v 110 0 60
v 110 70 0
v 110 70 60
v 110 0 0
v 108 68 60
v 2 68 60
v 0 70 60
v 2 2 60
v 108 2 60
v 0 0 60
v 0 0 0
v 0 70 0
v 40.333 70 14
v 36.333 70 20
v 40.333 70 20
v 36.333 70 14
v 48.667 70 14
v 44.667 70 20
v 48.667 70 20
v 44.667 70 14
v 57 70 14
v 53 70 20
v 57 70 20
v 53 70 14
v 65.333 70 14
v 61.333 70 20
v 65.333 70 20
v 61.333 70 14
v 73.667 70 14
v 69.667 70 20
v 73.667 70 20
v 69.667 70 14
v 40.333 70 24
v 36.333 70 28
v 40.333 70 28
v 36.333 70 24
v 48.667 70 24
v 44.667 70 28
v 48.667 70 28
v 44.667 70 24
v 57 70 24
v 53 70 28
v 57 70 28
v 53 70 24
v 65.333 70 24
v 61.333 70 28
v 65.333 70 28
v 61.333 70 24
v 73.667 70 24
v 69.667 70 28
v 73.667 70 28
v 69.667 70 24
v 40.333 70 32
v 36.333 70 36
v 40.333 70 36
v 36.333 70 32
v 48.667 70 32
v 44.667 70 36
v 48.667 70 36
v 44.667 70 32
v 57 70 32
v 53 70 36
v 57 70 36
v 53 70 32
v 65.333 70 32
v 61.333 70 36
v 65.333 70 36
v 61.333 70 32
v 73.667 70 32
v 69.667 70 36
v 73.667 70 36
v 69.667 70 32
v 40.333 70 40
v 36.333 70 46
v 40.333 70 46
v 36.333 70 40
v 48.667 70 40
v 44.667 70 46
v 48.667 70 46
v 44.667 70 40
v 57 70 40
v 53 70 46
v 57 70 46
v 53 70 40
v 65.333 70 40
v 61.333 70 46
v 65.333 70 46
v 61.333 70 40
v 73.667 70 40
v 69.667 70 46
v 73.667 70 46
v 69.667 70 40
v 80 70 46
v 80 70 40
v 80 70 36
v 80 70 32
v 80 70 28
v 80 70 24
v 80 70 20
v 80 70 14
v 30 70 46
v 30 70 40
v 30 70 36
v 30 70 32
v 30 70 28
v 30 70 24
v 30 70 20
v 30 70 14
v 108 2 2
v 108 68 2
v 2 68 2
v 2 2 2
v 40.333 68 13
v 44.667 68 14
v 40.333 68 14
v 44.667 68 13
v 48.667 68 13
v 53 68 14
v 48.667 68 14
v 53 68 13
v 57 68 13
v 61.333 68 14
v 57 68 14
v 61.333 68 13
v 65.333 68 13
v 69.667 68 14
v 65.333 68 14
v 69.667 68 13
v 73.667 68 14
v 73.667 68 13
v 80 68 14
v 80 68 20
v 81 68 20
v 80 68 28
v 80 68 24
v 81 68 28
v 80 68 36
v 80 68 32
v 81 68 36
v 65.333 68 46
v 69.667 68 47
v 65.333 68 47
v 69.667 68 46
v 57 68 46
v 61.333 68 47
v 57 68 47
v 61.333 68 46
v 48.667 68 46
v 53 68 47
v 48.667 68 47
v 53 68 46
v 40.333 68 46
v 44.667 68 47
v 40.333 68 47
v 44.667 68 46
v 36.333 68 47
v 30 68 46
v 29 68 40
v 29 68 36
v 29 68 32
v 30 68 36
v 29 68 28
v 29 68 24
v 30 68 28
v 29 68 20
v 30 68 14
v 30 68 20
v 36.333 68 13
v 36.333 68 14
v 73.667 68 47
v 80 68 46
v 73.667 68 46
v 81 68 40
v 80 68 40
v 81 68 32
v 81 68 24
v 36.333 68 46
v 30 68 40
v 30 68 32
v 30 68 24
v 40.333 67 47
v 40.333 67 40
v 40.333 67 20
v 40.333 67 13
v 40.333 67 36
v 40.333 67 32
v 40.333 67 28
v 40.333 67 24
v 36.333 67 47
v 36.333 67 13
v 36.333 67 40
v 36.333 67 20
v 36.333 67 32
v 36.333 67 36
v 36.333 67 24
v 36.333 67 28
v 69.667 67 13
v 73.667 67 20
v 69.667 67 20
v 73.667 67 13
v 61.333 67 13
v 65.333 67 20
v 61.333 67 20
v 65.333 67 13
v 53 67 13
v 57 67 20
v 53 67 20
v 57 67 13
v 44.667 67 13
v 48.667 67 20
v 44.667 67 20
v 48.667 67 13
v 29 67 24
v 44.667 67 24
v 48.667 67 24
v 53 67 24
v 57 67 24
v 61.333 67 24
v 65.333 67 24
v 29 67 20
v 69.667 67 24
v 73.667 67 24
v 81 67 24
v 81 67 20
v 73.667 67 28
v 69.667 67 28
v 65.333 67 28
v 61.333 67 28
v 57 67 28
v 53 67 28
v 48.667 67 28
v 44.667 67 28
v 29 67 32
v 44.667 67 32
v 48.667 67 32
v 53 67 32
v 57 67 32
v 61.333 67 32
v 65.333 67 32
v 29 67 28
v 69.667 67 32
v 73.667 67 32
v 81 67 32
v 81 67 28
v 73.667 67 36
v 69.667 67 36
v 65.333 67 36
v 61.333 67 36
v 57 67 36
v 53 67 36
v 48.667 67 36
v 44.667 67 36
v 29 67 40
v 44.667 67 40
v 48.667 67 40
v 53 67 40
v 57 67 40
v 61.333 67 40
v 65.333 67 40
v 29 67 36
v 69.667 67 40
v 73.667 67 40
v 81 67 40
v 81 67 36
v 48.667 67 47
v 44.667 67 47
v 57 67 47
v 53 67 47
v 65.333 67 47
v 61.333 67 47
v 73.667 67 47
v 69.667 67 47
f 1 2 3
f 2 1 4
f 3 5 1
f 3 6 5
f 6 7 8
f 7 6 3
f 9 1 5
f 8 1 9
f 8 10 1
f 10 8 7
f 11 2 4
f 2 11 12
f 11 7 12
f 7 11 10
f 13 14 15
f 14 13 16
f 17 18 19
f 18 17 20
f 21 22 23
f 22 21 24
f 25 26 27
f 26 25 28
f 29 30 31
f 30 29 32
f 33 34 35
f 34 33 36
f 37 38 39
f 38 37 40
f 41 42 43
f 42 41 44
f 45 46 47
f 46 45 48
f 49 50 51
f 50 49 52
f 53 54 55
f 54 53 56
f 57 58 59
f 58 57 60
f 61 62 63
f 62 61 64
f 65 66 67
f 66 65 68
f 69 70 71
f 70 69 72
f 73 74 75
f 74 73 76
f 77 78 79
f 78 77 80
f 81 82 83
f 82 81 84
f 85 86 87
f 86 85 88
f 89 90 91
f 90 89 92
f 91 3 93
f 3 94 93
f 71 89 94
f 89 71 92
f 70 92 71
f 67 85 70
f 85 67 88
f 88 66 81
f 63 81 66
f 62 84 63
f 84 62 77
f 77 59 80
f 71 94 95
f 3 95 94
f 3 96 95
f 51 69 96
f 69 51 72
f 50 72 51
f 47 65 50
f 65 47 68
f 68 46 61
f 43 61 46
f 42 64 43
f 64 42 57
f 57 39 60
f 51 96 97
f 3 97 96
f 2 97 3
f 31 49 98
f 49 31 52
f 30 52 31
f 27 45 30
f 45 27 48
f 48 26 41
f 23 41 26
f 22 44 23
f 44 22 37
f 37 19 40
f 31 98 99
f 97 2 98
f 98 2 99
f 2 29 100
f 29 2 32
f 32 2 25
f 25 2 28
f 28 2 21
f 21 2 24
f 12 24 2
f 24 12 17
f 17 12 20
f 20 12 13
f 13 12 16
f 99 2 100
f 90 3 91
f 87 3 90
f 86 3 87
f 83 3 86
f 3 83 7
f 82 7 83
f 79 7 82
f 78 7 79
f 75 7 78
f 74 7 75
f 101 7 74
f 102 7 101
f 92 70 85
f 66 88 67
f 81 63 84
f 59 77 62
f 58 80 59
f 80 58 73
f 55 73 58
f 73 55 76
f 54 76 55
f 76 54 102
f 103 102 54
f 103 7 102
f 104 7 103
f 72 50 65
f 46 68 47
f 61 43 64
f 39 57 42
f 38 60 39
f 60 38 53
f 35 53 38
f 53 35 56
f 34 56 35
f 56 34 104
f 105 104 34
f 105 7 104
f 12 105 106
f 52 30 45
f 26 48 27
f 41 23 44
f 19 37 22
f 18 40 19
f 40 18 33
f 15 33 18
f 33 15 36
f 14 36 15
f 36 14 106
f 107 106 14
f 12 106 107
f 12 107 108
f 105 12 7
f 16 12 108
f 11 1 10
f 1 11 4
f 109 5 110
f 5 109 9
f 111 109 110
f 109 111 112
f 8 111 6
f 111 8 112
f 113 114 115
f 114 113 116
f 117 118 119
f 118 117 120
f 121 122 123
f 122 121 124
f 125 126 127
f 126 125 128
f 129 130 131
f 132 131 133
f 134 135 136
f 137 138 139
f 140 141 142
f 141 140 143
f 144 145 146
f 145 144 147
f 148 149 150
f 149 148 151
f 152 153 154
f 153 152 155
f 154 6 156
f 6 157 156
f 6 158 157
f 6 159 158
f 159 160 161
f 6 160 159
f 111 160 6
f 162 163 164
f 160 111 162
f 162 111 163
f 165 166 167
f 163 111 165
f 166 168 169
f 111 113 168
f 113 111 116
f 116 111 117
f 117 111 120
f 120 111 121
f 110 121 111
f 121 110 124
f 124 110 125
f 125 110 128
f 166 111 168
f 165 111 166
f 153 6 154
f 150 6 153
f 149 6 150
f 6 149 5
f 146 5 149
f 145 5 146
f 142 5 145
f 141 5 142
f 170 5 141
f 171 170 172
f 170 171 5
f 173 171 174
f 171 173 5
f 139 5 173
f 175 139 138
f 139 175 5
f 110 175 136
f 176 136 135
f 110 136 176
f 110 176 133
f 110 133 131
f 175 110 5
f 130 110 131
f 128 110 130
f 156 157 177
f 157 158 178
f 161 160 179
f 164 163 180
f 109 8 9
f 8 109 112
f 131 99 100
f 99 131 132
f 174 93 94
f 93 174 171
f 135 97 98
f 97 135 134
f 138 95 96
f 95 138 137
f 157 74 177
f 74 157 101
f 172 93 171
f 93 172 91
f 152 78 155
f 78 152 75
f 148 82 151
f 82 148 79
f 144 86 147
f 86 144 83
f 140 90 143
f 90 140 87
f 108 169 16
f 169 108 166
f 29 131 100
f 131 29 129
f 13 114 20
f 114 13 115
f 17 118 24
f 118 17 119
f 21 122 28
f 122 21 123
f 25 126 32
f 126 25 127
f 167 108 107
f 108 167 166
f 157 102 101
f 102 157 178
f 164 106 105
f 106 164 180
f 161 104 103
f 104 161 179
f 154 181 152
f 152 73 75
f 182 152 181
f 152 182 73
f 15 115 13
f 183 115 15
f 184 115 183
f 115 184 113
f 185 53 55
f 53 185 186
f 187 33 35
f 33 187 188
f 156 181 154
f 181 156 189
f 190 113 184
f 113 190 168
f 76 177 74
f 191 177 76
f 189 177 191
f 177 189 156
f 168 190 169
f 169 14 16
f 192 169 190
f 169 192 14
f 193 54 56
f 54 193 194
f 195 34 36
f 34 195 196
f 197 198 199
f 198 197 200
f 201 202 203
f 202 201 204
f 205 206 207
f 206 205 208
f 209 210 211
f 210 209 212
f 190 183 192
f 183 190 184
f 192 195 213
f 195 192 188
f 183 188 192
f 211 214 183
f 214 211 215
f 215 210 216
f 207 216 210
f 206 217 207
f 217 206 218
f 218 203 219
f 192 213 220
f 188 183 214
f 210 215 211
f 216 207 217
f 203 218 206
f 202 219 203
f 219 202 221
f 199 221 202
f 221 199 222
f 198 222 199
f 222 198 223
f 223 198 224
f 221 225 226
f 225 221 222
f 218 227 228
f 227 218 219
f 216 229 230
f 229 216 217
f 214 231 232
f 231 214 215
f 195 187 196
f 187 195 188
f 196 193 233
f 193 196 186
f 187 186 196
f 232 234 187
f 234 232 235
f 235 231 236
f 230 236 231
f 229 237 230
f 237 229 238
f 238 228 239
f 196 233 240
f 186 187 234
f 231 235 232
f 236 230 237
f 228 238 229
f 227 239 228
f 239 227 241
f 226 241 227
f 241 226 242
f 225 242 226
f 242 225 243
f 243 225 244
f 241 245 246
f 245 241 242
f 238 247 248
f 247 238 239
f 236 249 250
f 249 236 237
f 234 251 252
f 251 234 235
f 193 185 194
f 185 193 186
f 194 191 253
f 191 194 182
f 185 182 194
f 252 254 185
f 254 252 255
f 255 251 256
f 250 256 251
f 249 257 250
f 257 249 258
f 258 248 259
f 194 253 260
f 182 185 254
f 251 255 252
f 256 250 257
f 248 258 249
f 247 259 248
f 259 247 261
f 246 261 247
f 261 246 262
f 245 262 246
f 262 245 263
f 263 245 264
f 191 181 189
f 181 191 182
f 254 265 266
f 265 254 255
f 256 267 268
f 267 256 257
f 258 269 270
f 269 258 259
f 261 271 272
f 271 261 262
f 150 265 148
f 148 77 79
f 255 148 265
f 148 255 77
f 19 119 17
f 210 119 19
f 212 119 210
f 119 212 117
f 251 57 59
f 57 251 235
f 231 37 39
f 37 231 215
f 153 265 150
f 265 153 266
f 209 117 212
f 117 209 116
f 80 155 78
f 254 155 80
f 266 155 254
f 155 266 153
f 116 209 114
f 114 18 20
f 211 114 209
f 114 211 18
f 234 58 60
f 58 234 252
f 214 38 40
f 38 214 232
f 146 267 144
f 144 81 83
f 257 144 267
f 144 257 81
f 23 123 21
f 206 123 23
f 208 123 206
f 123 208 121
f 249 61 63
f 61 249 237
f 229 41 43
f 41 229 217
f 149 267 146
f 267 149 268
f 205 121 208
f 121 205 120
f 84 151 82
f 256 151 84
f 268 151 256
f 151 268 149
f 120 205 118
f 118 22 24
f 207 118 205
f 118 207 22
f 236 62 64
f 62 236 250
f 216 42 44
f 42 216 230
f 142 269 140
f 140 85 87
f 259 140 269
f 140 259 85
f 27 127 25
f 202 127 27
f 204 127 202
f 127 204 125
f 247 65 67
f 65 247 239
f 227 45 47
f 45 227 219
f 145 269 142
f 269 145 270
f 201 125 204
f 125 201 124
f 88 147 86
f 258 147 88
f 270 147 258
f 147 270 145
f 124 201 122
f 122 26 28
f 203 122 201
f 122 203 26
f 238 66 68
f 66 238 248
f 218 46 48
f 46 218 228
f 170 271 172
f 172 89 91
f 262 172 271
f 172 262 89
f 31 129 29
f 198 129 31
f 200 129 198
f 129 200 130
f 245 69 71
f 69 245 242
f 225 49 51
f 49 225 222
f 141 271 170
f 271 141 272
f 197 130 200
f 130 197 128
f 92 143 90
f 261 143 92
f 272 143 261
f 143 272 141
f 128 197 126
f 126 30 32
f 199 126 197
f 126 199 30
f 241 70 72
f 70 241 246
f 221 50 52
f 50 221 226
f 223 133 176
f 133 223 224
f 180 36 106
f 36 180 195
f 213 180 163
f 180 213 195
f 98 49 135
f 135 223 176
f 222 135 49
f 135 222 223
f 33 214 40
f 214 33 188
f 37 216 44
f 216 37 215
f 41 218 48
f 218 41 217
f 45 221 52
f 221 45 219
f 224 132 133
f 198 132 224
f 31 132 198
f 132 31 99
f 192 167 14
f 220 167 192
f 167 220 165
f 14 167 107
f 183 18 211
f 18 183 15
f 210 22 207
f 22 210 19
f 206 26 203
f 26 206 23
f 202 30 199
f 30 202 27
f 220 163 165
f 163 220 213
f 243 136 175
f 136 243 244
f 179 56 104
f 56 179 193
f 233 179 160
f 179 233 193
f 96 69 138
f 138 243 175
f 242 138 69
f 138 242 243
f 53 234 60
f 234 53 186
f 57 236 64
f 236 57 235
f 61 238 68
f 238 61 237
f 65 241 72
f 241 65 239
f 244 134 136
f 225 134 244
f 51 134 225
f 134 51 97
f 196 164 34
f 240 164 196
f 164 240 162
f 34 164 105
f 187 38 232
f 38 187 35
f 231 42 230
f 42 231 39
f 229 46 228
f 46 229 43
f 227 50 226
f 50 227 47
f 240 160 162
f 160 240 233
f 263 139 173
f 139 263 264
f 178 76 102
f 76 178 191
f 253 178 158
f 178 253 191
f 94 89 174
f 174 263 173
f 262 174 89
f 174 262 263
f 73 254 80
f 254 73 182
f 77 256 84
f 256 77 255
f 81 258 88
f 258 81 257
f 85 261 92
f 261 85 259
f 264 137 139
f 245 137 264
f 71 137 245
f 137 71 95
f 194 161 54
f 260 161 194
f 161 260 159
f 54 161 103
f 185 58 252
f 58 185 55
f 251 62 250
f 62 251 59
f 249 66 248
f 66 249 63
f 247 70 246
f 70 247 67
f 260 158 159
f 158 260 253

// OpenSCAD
$fn = 32;

// ----------------------------------------------------------------------
// Vent box: crossgrid enclosure
// ----------------------------------------------------------------------

// --- parameters (mm) ---
box_l = 110;              // box length, X
box_w = 70;               // box width, Y
box_h = 60;               // box height, Z
wall_t = 2;               // shell wall thickness
win_l = 50;               // vent window width, X
win_h = 32;               // vent window height, Z
bar_w = 4;                // grid bar width
n_v = 5;                  // vertical bar count
n_h = 3;                  // horizontal bar count

win_z0 = (box_h - win_h) / 2;  // window lower edge Z
v_step = win_l / (n_v + 1);  // vertical bar step
h_step = win_h / (n_h + 1);  // horizontal bar step

difference() {
  union() {
    difference() {
      cube([box_l, box_w, box_h]);
  translate([wall_t, wall_t, wall_t])
    cube([box_l - 2 * wall_t, box_w - 2 * wall_t, box_h]);
  translate([(box_l - win_l) / 2, box_w - wall_t - 1, win_z0])
    cube([win_l, wall_t + 2, win_h]);
    }
    for (i = [1 : n_v])
      translate([(box_l - win_l) / 2 + i * v_step - bar_w / 2,
                 box_w - wall_t - 1, win_z0 - 1])
        cube([bar_w, wall_t + 1, win_h + 2]);
    for (i = [1 : n_h])
      translate([(box_l - win_l) / 2 - 1, box_w - wall_t - 1,
                 win_z0 + i * h_step - bar_w / 2])
        cube([win_l + 2, wall_t + 1, bar_w]);
  }
}
